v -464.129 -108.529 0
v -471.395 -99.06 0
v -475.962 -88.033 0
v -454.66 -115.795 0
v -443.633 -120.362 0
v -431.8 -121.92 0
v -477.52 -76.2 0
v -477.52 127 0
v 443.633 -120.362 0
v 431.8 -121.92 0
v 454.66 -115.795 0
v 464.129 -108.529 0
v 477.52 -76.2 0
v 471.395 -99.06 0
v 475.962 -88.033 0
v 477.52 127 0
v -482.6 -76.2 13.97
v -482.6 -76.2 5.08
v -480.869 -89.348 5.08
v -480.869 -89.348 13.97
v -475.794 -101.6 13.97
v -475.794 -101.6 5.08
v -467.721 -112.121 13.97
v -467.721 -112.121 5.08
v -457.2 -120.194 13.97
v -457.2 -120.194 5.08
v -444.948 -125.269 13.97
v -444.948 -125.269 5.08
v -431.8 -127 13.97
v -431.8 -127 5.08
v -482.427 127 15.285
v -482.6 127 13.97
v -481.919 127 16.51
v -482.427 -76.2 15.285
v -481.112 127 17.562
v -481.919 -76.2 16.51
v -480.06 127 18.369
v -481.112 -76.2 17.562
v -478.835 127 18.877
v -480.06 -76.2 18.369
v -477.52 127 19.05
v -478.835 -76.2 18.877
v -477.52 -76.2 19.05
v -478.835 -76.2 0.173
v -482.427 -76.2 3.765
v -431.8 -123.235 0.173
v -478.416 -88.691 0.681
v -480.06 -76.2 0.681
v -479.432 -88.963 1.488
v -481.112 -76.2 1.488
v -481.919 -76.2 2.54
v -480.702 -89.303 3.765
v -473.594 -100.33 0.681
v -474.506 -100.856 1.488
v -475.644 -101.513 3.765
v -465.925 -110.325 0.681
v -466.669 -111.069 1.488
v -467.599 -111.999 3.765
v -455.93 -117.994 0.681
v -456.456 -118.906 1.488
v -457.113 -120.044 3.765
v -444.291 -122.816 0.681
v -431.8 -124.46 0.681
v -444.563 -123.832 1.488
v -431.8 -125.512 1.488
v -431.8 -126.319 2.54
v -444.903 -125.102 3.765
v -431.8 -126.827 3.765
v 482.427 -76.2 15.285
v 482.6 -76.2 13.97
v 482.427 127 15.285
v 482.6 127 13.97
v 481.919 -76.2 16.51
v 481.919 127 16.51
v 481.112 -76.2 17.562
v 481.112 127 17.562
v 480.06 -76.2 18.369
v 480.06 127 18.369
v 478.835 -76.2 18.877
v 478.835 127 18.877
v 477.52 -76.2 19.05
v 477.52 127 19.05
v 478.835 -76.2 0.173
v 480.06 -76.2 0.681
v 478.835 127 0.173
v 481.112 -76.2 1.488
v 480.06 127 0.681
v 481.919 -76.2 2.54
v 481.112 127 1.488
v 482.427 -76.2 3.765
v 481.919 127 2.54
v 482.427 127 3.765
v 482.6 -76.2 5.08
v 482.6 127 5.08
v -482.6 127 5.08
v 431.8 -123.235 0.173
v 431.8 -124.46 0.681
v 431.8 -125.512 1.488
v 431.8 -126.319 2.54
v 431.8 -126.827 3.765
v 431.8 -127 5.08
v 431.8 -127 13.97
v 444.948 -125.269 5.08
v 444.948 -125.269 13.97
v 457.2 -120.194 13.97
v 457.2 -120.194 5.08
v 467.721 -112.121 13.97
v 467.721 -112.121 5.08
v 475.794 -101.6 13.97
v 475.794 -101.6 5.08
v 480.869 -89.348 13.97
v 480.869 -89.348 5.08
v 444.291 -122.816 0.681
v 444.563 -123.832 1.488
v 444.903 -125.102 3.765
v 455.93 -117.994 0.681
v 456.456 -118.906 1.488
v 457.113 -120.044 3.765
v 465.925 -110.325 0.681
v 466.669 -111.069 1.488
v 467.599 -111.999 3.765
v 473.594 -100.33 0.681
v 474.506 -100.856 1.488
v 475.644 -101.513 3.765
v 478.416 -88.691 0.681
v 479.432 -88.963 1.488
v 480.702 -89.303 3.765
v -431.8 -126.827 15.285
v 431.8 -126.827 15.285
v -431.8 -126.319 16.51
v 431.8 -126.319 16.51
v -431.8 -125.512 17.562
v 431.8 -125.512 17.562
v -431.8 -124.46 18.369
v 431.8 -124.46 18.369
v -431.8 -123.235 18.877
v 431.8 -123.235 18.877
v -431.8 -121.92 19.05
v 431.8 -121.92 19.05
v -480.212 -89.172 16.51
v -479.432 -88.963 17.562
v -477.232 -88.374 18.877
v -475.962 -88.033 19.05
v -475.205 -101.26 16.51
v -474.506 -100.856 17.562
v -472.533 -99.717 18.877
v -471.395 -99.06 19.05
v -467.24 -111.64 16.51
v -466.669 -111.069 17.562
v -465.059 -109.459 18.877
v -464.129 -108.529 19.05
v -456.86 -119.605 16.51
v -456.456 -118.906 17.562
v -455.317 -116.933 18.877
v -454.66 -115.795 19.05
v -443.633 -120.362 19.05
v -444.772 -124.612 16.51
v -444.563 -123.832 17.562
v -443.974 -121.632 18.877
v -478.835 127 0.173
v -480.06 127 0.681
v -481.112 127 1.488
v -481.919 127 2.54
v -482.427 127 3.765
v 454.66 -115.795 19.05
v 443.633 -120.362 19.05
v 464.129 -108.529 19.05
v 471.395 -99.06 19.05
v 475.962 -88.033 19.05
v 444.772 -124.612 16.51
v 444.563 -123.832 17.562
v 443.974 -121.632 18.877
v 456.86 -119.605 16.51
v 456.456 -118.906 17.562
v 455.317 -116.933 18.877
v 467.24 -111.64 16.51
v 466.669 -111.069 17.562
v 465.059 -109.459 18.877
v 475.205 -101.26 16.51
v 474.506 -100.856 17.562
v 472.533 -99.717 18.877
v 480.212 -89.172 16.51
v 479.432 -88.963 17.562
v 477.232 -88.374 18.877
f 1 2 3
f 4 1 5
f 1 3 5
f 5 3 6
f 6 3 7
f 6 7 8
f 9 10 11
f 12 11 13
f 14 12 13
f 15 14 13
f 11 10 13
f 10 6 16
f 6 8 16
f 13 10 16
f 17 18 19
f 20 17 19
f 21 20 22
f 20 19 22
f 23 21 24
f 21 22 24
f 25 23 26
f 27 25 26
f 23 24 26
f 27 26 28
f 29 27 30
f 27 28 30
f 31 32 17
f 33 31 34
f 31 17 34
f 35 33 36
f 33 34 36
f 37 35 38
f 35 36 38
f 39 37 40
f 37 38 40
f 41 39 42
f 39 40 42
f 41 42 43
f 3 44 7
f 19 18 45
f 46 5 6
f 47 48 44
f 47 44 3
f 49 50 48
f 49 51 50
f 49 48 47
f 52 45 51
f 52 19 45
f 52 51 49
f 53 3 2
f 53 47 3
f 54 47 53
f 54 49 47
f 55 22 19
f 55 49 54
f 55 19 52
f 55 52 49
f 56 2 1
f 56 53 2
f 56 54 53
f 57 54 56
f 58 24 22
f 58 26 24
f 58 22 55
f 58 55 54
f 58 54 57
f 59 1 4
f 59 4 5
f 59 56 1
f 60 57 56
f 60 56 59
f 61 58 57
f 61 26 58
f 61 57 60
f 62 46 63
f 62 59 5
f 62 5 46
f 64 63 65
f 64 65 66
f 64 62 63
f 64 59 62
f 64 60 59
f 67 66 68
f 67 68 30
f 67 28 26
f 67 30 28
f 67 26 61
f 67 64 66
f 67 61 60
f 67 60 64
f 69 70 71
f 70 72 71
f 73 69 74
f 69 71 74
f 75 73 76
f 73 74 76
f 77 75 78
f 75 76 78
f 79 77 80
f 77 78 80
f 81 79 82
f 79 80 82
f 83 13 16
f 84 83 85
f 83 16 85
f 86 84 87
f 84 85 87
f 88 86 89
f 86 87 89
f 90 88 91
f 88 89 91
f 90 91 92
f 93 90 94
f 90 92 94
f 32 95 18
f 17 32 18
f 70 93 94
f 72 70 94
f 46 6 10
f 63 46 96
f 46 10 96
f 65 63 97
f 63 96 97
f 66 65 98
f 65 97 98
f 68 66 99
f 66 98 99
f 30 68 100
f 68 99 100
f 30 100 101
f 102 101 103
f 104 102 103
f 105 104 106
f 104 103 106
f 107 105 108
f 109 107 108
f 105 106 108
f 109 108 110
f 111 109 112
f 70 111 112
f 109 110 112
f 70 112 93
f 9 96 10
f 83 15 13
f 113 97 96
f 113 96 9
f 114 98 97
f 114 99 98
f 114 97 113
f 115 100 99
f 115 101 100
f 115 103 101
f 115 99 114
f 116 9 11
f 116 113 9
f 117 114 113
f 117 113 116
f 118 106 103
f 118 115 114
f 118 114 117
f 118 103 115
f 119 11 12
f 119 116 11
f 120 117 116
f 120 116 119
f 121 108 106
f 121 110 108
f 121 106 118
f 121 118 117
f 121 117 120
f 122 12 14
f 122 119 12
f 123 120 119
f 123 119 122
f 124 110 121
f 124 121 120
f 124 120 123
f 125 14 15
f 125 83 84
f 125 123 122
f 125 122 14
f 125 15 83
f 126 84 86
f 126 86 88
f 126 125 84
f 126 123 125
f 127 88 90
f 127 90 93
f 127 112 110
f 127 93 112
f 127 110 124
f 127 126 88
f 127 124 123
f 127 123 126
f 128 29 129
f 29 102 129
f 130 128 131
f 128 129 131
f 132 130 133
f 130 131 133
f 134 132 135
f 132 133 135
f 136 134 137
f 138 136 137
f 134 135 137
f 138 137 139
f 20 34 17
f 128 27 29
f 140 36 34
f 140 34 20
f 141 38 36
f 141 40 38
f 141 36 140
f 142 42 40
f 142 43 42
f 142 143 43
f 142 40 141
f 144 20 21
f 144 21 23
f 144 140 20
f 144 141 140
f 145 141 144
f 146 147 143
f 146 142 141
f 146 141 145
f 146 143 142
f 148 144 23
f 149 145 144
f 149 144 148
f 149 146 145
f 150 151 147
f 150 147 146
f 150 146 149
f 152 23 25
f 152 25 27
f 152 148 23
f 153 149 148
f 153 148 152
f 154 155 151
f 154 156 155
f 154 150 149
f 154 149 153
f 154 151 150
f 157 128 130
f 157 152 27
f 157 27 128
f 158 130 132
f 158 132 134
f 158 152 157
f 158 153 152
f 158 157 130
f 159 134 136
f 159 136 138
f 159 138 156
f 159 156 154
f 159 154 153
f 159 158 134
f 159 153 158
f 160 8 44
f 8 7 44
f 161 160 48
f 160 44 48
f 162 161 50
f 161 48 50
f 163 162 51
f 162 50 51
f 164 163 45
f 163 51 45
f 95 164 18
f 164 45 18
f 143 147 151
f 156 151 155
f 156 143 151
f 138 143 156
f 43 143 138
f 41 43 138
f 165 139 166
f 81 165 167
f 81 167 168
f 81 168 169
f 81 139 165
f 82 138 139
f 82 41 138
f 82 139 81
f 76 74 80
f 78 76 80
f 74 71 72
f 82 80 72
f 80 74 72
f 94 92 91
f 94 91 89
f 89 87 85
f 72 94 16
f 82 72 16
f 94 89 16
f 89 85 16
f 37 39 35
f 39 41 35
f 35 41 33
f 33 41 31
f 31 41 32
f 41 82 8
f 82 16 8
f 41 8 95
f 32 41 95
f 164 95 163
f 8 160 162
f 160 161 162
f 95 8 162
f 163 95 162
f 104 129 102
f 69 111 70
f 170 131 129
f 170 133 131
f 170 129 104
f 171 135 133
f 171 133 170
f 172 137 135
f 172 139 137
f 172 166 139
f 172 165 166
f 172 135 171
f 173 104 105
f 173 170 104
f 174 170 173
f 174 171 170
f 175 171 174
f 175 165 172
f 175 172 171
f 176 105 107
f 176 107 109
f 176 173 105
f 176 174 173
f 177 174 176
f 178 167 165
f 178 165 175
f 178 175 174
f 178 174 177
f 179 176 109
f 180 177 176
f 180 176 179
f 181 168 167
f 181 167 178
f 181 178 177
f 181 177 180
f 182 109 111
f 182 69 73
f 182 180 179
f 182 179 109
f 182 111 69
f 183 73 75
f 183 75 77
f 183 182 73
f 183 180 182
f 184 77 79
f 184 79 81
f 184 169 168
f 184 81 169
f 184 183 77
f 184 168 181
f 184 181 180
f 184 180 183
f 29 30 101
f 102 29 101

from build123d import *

# Parameters (mm, degrees)
F1_DEPTH = 19.05
F2_R     = 5.08
F3_R     = 5.08


with BuildPart() as f1:
    # F0 (on Top) → F1 (new body)
    with BuildSketch(Plane.XY):
        with BuildLine():
            Line((482.6, 127), (-482.6, 127))
            Line((-482.6, 127), (-482.6, -76.2))
            ThreePointArc((-482.6, -76.2), (-467.721024, -112.121024), (-431.8, -127))
            Line((-431.8, -127), (431.8, -127))
            ThreePointArc((431.8, -127), (467.721024, -112.121024), (482.6, -76.2))
            Line((482.6, -76.2), (482.6, 127))
        make_face()
    extrude(amount=F1_DEPTH)

    # F2
    f2_edges = [f1.edges().sort_by_distance(p)[0] for p in [
        (0, -127, 19.05),
    ]]
    fillet(f2_edges, radius=F2_R)

    # F3
    f3_edges = [f1.edges().sort_by_distance(p)[0] for p in [
        (0, -127, 0),
    ]]
    fillet(f3_edges, radius=F3_R)


solid = f1.part
